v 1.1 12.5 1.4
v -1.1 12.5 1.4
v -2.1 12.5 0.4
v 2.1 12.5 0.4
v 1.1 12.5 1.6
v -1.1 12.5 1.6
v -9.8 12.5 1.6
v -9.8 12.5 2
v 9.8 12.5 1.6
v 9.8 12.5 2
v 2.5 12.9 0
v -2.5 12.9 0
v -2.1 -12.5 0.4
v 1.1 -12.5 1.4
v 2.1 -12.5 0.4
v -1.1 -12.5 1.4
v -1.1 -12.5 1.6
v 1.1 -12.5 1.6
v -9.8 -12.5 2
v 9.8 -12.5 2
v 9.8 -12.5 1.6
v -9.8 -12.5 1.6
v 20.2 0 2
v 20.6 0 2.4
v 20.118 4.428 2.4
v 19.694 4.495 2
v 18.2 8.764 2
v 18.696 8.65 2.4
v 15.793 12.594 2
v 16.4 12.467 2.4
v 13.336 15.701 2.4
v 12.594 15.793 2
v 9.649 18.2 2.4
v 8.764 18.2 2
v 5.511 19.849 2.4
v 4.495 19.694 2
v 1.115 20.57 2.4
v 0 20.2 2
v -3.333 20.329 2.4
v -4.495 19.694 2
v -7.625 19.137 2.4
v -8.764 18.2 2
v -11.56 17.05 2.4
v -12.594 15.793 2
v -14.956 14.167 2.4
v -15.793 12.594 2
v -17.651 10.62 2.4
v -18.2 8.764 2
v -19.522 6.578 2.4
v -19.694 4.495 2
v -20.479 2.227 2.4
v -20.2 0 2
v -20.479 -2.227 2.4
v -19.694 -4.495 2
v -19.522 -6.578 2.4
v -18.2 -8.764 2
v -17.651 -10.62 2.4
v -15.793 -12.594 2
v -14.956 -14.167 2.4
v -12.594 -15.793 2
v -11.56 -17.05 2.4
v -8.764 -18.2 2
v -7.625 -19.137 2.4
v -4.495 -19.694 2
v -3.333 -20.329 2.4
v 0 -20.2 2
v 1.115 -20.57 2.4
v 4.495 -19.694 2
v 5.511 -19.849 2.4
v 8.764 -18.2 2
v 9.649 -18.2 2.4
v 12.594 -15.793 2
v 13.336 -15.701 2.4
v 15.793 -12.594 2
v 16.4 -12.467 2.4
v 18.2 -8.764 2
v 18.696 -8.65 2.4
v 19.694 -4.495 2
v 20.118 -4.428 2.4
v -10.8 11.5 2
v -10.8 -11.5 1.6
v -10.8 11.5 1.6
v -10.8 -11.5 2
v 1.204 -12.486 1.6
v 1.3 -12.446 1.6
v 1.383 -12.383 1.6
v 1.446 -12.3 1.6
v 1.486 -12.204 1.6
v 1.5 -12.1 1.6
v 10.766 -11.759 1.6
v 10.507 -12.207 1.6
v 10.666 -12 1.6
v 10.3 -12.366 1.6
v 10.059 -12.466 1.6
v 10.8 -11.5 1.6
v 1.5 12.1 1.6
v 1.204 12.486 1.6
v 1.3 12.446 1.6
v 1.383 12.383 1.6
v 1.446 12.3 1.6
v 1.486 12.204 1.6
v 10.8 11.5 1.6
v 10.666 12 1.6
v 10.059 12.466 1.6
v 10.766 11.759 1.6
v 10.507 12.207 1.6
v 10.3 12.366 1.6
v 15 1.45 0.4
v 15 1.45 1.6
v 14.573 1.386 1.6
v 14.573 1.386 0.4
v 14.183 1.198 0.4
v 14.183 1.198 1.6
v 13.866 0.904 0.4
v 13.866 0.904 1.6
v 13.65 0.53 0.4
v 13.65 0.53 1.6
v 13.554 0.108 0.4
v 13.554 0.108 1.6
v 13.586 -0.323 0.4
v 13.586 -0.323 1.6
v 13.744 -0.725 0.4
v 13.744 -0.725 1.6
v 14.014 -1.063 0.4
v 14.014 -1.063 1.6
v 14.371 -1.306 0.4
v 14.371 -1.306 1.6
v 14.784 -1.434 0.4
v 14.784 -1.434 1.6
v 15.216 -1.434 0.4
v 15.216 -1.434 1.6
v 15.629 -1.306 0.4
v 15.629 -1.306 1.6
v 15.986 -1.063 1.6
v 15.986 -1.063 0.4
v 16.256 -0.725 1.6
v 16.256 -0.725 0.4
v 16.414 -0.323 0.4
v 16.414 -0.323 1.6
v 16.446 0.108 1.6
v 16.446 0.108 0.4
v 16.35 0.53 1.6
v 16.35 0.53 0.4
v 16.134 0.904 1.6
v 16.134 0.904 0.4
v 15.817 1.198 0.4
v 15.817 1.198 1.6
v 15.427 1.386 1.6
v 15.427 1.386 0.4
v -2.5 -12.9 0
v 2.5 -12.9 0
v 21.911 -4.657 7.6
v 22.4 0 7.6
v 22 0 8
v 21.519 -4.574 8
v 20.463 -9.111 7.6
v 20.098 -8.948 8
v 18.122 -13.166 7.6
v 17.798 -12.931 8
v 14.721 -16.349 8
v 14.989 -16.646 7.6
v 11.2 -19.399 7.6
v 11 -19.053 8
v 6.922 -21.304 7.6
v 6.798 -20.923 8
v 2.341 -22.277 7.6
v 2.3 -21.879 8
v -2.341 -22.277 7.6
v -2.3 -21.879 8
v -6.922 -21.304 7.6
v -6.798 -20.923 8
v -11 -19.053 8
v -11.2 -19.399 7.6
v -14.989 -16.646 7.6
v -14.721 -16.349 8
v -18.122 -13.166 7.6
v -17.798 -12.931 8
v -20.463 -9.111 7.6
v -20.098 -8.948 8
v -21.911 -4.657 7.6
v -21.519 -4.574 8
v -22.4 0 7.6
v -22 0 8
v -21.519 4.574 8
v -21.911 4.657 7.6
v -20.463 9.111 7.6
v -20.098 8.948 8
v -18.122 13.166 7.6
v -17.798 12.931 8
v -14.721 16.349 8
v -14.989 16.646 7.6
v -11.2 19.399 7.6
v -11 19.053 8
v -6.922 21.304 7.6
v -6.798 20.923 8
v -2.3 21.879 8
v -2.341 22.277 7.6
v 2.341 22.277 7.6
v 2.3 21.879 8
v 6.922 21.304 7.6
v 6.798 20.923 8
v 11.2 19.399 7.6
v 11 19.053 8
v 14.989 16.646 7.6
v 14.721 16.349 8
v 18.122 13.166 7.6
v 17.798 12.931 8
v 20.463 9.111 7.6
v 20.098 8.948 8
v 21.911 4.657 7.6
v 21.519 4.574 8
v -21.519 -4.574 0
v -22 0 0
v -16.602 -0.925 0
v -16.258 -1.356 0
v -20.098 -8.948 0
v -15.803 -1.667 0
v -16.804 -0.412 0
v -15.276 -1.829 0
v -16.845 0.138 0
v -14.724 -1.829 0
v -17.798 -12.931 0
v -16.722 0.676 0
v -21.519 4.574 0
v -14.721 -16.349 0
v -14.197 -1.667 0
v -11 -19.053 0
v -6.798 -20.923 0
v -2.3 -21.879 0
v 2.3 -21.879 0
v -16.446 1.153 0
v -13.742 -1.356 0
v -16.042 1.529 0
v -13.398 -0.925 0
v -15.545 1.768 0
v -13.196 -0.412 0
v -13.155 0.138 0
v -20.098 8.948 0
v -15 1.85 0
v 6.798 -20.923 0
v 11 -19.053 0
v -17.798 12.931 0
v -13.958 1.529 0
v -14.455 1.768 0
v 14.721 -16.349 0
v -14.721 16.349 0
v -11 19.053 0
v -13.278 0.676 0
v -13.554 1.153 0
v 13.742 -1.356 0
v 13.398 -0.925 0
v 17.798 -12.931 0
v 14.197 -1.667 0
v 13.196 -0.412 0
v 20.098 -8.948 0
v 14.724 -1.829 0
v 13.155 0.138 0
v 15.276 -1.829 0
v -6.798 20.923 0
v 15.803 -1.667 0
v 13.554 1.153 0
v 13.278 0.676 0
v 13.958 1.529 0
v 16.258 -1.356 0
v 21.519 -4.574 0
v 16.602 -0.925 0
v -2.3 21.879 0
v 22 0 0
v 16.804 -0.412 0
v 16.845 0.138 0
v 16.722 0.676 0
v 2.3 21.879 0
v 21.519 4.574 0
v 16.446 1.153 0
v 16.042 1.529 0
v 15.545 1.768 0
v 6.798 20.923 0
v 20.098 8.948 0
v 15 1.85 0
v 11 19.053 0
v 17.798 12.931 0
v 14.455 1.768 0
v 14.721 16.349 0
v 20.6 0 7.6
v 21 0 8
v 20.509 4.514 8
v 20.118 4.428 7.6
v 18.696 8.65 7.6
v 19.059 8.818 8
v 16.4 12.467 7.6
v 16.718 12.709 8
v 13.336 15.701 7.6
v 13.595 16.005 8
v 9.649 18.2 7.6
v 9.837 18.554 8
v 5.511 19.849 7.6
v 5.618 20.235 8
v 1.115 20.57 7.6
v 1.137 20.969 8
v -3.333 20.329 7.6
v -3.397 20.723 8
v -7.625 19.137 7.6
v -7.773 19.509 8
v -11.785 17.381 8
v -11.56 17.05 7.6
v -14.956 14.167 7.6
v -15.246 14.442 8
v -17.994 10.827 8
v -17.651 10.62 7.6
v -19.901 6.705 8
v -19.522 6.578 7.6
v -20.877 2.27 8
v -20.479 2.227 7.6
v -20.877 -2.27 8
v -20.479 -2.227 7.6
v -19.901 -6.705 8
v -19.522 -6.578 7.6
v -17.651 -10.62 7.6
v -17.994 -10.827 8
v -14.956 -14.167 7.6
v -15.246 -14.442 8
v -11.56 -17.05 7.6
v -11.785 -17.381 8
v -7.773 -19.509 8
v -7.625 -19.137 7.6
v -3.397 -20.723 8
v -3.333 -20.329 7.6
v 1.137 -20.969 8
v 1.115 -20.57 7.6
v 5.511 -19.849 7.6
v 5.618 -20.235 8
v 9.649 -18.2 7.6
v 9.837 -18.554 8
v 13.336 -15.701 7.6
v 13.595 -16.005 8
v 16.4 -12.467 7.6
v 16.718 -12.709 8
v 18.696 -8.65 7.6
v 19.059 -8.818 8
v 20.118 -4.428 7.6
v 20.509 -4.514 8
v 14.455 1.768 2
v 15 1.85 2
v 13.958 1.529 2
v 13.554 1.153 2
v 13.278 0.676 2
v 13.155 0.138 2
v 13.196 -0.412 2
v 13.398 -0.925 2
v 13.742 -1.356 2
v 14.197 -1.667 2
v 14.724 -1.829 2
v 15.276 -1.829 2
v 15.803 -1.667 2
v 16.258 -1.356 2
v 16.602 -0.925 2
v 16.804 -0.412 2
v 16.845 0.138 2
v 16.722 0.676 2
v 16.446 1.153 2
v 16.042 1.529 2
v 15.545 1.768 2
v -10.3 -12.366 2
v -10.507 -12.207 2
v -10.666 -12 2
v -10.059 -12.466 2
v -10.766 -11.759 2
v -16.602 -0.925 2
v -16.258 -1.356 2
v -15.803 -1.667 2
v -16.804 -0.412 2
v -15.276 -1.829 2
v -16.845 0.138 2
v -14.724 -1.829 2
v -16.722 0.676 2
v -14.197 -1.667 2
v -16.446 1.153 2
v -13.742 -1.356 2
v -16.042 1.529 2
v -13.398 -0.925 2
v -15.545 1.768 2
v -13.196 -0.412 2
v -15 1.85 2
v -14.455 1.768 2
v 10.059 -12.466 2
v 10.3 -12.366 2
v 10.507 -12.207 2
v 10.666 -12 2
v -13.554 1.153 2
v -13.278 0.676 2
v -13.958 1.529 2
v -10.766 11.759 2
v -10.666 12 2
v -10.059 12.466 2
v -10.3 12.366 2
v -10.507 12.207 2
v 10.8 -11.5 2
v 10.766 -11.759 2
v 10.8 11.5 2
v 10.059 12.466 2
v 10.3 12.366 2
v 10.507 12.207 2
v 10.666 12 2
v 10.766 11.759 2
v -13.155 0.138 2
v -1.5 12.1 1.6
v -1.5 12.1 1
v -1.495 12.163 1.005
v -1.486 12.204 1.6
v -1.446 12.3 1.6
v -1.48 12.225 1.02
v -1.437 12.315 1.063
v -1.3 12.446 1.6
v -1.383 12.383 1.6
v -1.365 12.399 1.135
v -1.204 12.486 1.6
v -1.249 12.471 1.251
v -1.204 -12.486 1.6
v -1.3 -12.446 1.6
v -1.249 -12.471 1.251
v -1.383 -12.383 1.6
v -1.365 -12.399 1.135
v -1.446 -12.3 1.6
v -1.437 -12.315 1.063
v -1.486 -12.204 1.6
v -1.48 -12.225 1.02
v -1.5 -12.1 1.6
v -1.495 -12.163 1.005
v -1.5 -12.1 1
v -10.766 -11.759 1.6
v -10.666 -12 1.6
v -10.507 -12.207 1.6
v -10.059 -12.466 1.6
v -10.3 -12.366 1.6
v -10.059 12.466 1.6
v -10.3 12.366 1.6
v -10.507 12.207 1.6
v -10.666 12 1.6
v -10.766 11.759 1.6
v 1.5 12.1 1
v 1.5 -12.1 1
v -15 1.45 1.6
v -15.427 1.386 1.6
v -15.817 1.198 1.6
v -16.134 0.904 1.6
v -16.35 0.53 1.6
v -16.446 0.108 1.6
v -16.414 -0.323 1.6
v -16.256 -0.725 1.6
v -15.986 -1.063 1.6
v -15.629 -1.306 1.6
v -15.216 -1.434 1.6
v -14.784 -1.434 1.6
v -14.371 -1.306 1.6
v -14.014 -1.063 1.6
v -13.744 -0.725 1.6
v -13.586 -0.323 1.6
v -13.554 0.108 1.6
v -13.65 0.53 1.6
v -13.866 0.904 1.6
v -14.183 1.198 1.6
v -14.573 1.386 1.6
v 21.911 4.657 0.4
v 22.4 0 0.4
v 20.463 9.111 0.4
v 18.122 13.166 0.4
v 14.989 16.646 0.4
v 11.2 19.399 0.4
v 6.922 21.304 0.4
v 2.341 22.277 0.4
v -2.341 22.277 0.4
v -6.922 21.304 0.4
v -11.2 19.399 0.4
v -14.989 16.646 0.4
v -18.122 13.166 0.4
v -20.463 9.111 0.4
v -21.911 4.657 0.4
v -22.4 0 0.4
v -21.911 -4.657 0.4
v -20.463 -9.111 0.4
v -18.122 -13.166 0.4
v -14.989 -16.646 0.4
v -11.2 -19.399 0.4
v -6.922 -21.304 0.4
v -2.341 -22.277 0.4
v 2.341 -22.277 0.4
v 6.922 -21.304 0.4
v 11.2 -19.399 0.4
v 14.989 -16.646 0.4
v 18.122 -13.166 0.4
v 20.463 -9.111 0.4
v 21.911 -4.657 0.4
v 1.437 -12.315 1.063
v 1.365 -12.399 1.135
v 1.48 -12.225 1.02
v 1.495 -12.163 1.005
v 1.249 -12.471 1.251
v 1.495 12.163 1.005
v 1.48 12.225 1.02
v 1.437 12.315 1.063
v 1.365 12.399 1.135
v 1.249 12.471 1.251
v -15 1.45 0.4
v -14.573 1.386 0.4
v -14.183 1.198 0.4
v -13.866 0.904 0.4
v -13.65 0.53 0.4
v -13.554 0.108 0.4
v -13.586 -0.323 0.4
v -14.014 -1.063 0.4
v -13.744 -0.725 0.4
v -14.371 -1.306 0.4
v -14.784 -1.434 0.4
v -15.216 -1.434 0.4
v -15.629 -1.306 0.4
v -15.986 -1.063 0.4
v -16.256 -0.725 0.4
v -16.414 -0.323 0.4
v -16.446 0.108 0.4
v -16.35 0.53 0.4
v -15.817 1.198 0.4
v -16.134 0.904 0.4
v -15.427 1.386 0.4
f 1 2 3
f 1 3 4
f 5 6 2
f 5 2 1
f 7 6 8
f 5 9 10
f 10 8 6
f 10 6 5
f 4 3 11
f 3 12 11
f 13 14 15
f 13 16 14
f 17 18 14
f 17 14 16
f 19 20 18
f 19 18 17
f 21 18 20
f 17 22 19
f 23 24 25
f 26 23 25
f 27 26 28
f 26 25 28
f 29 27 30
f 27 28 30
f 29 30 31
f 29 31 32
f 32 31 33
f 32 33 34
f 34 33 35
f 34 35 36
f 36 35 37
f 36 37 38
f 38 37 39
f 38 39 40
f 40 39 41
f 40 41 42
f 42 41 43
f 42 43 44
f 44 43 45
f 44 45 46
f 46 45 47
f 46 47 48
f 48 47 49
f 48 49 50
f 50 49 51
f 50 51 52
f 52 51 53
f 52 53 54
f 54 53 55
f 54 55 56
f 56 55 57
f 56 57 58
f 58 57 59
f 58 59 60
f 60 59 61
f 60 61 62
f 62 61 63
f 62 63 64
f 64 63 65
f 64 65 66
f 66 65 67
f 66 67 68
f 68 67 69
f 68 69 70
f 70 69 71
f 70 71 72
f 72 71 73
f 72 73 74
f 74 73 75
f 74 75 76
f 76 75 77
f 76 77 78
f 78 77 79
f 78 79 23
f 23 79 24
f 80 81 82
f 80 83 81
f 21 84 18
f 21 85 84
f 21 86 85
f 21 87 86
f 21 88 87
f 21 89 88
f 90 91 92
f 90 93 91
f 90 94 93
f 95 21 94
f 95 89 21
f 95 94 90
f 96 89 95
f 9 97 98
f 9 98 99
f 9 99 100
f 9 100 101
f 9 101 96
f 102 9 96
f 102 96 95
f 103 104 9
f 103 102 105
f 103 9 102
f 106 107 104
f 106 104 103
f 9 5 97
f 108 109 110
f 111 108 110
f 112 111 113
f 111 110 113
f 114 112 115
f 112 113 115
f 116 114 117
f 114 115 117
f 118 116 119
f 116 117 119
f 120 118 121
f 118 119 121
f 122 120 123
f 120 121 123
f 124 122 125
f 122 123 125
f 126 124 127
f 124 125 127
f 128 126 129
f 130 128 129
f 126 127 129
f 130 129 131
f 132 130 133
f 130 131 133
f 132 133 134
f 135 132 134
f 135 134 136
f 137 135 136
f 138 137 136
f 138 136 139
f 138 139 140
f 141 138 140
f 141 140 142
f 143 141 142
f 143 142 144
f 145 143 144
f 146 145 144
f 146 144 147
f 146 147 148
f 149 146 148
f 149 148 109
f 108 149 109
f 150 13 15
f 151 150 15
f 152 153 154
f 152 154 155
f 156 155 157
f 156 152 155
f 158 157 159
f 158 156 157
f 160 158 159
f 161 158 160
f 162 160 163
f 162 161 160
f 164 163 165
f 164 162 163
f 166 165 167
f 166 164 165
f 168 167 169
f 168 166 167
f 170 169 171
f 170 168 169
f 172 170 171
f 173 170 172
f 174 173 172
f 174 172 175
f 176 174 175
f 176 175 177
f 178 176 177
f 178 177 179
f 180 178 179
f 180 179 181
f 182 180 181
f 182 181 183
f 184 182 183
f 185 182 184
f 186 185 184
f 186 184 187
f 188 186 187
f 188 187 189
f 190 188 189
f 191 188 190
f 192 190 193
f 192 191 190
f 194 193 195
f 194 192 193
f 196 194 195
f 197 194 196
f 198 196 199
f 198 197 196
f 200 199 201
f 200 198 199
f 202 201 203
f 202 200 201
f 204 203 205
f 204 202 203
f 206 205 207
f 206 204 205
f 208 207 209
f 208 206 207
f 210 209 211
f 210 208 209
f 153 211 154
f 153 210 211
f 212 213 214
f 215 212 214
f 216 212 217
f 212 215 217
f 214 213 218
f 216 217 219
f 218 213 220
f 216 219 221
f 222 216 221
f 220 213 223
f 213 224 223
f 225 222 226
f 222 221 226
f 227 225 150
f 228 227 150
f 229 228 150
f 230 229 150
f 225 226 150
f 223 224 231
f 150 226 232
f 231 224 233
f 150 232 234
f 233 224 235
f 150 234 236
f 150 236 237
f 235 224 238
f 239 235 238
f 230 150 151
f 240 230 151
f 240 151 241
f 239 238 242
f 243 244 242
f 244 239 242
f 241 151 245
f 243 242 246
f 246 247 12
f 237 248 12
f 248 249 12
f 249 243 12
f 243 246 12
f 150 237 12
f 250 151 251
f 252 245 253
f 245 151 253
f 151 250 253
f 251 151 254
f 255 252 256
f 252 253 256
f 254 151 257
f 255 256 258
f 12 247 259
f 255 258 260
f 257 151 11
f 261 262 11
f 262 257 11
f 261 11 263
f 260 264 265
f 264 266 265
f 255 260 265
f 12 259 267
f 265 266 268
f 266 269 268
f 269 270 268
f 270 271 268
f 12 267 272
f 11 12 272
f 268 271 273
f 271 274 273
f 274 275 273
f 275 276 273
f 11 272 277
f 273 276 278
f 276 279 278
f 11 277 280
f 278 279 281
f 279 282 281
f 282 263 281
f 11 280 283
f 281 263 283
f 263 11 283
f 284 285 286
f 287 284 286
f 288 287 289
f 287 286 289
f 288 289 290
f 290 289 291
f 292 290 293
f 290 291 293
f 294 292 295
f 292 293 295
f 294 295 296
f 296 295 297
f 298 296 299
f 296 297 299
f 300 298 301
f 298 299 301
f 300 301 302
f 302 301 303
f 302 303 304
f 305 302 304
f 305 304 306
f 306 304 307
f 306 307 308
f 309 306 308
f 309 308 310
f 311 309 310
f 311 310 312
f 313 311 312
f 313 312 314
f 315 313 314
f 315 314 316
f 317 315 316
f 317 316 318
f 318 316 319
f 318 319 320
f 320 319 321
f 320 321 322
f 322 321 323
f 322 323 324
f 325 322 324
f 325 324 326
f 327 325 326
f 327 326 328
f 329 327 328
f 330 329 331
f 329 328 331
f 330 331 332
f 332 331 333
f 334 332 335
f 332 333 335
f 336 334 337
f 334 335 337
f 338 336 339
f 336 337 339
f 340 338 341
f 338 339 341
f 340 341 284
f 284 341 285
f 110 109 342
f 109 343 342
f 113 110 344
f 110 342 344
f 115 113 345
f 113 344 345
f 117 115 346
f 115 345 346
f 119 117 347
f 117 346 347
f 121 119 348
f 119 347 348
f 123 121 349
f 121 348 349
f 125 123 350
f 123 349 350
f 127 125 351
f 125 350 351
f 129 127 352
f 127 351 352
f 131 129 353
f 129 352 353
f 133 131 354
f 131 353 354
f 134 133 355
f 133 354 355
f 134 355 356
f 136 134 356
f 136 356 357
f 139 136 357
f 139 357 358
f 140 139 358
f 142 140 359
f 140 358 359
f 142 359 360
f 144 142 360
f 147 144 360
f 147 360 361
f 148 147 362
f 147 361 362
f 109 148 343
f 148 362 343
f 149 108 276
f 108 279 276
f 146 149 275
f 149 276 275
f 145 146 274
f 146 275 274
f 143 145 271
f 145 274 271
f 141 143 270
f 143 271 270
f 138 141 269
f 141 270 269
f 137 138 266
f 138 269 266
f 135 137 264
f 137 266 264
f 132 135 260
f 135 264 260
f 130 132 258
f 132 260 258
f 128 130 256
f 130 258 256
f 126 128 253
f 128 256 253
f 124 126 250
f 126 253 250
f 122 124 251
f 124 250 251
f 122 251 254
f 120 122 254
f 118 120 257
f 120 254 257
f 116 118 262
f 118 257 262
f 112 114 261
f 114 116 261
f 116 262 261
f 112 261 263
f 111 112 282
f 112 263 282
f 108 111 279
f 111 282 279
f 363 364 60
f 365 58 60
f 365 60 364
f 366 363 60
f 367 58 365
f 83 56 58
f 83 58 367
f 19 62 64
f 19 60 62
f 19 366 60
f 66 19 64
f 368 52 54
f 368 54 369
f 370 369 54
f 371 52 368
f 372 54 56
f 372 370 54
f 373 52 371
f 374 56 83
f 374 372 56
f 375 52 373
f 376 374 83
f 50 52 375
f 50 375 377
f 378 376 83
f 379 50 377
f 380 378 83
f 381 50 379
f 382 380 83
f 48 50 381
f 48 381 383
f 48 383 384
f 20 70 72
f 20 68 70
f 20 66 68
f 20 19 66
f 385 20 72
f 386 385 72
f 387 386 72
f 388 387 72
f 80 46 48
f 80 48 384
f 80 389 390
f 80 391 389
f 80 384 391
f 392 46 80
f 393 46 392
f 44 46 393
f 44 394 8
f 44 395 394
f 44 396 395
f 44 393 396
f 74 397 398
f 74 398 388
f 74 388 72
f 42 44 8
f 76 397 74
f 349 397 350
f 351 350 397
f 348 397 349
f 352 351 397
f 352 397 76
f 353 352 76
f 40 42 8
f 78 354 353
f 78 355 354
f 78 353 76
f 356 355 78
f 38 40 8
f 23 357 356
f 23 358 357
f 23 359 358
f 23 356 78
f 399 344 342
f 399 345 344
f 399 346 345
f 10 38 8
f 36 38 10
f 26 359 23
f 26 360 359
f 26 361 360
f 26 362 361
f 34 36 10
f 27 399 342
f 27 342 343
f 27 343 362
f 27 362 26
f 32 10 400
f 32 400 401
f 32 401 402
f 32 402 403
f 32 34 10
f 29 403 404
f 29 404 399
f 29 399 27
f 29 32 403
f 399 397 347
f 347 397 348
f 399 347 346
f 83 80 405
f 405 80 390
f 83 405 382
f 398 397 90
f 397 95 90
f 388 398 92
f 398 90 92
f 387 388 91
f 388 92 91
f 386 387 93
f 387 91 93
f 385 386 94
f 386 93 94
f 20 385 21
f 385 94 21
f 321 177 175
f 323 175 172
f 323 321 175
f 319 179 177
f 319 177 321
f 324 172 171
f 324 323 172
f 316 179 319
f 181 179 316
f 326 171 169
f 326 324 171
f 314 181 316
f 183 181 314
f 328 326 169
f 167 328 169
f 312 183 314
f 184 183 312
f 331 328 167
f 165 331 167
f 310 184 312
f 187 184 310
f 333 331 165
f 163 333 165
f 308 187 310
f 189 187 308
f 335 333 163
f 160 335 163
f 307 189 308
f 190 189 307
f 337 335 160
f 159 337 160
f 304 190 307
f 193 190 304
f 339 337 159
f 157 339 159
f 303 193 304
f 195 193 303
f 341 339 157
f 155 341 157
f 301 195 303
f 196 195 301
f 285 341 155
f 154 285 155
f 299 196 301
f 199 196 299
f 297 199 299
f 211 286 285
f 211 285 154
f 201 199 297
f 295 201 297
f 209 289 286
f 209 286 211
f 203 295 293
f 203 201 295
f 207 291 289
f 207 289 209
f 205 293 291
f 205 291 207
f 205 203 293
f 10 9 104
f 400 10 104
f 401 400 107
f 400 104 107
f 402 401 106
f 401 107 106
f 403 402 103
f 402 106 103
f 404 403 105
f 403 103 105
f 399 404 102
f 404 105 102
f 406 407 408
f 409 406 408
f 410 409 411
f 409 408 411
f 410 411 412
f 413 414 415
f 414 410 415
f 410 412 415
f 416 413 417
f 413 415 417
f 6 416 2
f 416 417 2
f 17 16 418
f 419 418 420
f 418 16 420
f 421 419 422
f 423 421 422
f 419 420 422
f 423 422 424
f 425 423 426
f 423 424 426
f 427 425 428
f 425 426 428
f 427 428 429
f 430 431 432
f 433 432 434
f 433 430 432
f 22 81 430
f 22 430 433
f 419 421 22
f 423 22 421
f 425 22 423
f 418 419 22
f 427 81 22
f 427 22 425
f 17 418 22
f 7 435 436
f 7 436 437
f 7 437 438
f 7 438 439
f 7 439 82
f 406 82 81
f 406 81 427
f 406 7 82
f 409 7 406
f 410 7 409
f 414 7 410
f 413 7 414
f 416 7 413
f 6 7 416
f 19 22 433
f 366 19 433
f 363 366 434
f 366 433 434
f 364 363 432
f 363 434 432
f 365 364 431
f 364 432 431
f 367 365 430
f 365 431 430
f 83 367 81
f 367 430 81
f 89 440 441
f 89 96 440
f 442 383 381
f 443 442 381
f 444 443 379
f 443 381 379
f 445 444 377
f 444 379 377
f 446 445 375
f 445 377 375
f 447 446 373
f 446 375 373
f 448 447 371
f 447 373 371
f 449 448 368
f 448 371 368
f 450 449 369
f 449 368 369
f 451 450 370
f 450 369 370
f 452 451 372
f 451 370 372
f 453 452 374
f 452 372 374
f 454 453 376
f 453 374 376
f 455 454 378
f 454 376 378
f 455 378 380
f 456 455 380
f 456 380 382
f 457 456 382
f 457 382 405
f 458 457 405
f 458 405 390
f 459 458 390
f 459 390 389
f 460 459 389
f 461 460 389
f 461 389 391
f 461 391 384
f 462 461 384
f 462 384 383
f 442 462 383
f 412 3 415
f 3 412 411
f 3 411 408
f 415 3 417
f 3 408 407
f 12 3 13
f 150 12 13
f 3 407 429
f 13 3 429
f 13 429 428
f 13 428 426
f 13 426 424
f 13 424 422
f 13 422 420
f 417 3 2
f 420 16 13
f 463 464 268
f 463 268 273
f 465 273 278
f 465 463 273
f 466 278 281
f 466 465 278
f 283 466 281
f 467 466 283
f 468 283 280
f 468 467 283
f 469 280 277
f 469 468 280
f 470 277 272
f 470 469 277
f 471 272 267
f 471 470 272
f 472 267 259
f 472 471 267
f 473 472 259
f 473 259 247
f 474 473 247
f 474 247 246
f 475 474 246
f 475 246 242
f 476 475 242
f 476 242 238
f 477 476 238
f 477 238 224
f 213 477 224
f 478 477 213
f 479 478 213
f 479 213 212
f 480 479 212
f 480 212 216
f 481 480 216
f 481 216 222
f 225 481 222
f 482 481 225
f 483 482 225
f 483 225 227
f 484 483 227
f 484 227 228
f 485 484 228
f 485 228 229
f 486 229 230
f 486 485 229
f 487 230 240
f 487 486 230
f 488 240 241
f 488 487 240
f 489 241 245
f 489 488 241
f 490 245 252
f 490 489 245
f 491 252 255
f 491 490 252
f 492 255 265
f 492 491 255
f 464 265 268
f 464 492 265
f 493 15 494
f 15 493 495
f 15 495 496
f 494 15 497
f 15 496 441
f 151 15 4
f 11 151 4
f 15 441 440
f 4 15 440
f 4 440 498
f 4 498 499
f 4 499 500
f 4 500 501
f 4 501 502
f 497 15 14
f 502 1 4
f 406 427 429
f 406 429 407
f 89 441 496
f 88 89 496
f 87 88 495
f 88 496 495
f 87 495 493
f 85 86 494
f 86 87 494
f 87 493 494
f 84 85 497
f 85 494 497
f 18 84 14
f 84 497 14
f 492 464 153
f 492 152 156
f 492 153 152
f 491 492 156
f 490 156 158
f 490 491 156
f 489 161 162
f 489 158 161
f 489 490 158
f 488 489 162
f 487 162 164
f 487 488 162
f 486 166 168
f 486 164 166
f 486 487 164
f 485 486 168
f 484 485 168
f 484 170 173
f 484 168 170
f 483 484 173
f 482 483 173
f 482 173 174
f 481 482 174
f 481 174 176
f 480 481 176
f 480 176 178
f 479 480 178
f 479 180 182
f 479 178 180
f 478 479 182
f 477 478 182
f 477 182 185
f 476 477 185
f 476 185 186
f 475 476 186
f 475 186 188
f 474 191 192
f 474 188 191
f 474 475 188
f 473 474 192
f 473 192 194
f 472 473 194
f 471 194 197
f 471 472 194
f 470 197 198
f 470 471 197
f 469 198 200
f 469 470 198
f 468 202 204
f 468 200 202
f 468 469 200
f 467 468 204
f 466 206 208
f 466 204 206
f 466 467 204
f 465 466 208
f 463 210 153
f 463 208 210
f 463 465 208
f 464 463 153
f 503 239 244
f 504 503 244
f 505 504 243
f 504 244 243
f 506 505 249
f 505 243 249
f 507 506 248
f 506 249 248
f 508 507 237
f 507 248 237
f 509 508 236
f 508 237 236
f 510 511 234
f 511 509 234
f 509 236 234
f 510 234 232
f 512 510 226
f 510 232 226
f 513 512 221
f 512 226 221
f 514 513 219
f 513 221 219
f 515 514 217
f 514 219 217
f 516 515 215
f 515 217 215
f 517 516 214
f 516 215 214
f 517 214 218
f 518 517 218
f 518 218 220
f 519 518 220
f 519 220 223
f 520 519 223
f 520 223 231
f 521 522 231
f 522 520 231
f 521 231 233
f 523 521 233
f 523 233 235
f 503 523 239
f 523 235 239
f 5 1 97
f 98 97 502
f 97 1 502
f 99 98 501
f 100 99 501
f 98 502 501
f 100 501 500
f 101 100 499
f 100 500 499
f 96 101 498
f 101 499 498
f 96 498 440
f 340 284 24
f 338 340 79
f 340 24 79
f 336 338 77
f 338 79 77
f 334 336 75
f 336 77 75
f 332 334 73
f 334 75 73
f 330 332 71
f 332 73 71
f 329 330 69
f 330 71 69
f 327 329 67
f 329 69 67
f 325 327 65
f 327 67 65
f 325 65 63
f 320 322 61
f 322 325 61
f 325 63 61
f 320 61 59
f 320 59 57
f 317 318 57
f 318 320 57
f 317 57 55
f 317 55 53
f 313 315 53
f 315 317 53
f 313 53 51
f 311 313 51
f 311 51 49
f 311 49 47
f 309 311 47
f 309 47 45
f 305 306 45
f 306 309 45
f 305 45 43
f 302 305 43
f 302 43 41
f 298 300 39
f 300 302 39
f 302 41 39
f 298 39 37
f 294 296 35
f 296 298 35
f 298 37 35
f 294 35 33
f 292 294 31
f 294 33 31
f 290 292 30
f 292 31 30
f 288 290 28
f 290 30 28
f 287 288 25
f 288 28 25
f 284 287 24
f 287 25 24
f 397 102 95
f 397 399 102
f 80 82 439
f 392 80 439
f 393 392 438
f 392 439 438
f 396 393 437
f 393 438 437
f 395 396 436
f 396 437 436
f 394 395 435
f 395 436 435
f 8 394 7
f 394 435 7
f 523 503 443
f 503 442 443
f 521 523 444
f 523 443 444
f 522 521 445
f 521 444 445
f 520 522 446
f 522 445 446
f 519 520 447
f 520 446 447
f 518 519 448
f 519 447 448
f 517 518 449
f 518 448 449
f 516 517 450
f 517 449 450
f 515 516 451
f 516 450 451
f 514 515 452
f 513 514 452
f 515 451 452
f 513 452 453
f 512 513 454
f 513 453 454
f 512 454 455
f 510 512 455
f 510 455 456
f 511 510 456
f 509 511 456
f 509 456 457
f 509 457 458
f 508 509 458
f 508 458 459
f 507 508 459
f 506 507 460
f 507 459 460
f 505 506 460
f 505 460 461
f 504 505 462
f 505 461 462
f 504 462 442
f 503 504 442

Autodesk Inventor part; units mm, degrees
ref_plane "YZ Plane" through (0, 0, 0) normal (1, 0, 0) x (0, 1, 0)
ref_plane "XZ Plane" through (0, 0, 0) normal (0, 1, 0) x (-1, 0, 0)
ref_plane "XY Plane" through (0, 0, 0) normal (0, 0, 1) x (1, 0, 0)
sketch "Sketch1" plane through (0, 0, 0) normal (0, 0, 1) x (1, 0, 0)
  circle A0 centre (0, 0) radius 20.6
  circle A1 centre (0, 0) radius 22.4
  dimension "d0" = 41.2
  dimension "d1" = 1.8
extrude "Extrusion1" add sketch "Sketch1" along normal blind 2 contours A0 | A1
extrude "Extrusion2" add sketch "Sketch1" along normal blind 8
sketch "Sketch2" plane through (0, 0, 2) normal (0, 0, 1) x (1, 0, 0)
  line L0 (-1.5, 12.5) -> (1.5, 12.5)
  line L1 (1.5, 12.5) -> (1.5, -12.5)
  line L2 (1.5, -12.5) -> (-1.5, -12.5)
  line L3 (-1.5, -12.5) -> (-1.5, 12.5)
  point P0 (0, 0)
  point P1 (0, 12.5)
  point P2 (1.5, 0)
  dimension "d6" = 3
  dimension "d7" = 25
extrude "Extrusion3" cut sketch "Sketch2" against normal through all
sketch "Sketch3" plane through (0, 0, 2) normal (0, 0, 1) x (1, 0, 0)
  line L0 (1.5, 12.5) -> (1.5, -12.5) projected
  line L1 (1.5, 12.5) -> (10.8, 12.5)
  line L2 (10.8, 12.5) -> (10.8, -12.5)
  line L3 (10.8, -12.5) -> (1.5, -12.5)
  line L4 (1.5, -12.5) -> (1.5, 12.5)
  point P0 (0, 0)
  dimension "d10" = 9.3
extrude "Extrusion4" cut sketch "Sketch3" against normal blind 0.4
mirror "Mirror1" about plane through (0, 0, 0) normal (1, 0, 0) of "Extrusion4"
chamfer "Chamfer1" distance 1 angle 45 2 edges at (1.5, 0, 0) (-1.5, 0, 0)
fillet "Fillet1" radius 0.4 4 edges at (-1.5, -12.5, 1.3) (1.5, -12.5, 1.3) (-1.5, 12.5, 1.3) (1.5, 12.5, 1.3)
fillet "Fillet2" radius 1 4 edges at (-10.8, 12.5, 1.8) (10.8, 12.5, 1.8) (10.8, -12.5, 1.8) (-10.8, -12.5, 1.8)
chamfer "Chamfer2" distance 0.4 angle 45 6 edges at (-22.4, 0, 8) (-20.6, 0, 8) (-20.6, 0, 2) (-22.4, 0, 0) (0, 12.5, 0) (0, -12.5, 0)
sketch "Sketch4" plane through (0, 0, 0) normal (0, 0, -1) x (-1, 0, 0)
  line L0 (15, 0) -> (-15, 0) construction
  point P0 (0, 0)
  point P1 (0, 0)
  dimension "d21" = 30
hole "Hole1" at (-15, 0, 0) at (15, 0, 0) direction (0, 0, 1) diameter 2.9 end through all
chamfer "Chamfer3" distance 0.4 angle 45 4 edges at (15, -1.45, 0) (-15, -1.45, 0) (15, -1.45, 2) (-15, -1.45, 2)
properties part number "takumar-slit" material "ABS Plastic"
